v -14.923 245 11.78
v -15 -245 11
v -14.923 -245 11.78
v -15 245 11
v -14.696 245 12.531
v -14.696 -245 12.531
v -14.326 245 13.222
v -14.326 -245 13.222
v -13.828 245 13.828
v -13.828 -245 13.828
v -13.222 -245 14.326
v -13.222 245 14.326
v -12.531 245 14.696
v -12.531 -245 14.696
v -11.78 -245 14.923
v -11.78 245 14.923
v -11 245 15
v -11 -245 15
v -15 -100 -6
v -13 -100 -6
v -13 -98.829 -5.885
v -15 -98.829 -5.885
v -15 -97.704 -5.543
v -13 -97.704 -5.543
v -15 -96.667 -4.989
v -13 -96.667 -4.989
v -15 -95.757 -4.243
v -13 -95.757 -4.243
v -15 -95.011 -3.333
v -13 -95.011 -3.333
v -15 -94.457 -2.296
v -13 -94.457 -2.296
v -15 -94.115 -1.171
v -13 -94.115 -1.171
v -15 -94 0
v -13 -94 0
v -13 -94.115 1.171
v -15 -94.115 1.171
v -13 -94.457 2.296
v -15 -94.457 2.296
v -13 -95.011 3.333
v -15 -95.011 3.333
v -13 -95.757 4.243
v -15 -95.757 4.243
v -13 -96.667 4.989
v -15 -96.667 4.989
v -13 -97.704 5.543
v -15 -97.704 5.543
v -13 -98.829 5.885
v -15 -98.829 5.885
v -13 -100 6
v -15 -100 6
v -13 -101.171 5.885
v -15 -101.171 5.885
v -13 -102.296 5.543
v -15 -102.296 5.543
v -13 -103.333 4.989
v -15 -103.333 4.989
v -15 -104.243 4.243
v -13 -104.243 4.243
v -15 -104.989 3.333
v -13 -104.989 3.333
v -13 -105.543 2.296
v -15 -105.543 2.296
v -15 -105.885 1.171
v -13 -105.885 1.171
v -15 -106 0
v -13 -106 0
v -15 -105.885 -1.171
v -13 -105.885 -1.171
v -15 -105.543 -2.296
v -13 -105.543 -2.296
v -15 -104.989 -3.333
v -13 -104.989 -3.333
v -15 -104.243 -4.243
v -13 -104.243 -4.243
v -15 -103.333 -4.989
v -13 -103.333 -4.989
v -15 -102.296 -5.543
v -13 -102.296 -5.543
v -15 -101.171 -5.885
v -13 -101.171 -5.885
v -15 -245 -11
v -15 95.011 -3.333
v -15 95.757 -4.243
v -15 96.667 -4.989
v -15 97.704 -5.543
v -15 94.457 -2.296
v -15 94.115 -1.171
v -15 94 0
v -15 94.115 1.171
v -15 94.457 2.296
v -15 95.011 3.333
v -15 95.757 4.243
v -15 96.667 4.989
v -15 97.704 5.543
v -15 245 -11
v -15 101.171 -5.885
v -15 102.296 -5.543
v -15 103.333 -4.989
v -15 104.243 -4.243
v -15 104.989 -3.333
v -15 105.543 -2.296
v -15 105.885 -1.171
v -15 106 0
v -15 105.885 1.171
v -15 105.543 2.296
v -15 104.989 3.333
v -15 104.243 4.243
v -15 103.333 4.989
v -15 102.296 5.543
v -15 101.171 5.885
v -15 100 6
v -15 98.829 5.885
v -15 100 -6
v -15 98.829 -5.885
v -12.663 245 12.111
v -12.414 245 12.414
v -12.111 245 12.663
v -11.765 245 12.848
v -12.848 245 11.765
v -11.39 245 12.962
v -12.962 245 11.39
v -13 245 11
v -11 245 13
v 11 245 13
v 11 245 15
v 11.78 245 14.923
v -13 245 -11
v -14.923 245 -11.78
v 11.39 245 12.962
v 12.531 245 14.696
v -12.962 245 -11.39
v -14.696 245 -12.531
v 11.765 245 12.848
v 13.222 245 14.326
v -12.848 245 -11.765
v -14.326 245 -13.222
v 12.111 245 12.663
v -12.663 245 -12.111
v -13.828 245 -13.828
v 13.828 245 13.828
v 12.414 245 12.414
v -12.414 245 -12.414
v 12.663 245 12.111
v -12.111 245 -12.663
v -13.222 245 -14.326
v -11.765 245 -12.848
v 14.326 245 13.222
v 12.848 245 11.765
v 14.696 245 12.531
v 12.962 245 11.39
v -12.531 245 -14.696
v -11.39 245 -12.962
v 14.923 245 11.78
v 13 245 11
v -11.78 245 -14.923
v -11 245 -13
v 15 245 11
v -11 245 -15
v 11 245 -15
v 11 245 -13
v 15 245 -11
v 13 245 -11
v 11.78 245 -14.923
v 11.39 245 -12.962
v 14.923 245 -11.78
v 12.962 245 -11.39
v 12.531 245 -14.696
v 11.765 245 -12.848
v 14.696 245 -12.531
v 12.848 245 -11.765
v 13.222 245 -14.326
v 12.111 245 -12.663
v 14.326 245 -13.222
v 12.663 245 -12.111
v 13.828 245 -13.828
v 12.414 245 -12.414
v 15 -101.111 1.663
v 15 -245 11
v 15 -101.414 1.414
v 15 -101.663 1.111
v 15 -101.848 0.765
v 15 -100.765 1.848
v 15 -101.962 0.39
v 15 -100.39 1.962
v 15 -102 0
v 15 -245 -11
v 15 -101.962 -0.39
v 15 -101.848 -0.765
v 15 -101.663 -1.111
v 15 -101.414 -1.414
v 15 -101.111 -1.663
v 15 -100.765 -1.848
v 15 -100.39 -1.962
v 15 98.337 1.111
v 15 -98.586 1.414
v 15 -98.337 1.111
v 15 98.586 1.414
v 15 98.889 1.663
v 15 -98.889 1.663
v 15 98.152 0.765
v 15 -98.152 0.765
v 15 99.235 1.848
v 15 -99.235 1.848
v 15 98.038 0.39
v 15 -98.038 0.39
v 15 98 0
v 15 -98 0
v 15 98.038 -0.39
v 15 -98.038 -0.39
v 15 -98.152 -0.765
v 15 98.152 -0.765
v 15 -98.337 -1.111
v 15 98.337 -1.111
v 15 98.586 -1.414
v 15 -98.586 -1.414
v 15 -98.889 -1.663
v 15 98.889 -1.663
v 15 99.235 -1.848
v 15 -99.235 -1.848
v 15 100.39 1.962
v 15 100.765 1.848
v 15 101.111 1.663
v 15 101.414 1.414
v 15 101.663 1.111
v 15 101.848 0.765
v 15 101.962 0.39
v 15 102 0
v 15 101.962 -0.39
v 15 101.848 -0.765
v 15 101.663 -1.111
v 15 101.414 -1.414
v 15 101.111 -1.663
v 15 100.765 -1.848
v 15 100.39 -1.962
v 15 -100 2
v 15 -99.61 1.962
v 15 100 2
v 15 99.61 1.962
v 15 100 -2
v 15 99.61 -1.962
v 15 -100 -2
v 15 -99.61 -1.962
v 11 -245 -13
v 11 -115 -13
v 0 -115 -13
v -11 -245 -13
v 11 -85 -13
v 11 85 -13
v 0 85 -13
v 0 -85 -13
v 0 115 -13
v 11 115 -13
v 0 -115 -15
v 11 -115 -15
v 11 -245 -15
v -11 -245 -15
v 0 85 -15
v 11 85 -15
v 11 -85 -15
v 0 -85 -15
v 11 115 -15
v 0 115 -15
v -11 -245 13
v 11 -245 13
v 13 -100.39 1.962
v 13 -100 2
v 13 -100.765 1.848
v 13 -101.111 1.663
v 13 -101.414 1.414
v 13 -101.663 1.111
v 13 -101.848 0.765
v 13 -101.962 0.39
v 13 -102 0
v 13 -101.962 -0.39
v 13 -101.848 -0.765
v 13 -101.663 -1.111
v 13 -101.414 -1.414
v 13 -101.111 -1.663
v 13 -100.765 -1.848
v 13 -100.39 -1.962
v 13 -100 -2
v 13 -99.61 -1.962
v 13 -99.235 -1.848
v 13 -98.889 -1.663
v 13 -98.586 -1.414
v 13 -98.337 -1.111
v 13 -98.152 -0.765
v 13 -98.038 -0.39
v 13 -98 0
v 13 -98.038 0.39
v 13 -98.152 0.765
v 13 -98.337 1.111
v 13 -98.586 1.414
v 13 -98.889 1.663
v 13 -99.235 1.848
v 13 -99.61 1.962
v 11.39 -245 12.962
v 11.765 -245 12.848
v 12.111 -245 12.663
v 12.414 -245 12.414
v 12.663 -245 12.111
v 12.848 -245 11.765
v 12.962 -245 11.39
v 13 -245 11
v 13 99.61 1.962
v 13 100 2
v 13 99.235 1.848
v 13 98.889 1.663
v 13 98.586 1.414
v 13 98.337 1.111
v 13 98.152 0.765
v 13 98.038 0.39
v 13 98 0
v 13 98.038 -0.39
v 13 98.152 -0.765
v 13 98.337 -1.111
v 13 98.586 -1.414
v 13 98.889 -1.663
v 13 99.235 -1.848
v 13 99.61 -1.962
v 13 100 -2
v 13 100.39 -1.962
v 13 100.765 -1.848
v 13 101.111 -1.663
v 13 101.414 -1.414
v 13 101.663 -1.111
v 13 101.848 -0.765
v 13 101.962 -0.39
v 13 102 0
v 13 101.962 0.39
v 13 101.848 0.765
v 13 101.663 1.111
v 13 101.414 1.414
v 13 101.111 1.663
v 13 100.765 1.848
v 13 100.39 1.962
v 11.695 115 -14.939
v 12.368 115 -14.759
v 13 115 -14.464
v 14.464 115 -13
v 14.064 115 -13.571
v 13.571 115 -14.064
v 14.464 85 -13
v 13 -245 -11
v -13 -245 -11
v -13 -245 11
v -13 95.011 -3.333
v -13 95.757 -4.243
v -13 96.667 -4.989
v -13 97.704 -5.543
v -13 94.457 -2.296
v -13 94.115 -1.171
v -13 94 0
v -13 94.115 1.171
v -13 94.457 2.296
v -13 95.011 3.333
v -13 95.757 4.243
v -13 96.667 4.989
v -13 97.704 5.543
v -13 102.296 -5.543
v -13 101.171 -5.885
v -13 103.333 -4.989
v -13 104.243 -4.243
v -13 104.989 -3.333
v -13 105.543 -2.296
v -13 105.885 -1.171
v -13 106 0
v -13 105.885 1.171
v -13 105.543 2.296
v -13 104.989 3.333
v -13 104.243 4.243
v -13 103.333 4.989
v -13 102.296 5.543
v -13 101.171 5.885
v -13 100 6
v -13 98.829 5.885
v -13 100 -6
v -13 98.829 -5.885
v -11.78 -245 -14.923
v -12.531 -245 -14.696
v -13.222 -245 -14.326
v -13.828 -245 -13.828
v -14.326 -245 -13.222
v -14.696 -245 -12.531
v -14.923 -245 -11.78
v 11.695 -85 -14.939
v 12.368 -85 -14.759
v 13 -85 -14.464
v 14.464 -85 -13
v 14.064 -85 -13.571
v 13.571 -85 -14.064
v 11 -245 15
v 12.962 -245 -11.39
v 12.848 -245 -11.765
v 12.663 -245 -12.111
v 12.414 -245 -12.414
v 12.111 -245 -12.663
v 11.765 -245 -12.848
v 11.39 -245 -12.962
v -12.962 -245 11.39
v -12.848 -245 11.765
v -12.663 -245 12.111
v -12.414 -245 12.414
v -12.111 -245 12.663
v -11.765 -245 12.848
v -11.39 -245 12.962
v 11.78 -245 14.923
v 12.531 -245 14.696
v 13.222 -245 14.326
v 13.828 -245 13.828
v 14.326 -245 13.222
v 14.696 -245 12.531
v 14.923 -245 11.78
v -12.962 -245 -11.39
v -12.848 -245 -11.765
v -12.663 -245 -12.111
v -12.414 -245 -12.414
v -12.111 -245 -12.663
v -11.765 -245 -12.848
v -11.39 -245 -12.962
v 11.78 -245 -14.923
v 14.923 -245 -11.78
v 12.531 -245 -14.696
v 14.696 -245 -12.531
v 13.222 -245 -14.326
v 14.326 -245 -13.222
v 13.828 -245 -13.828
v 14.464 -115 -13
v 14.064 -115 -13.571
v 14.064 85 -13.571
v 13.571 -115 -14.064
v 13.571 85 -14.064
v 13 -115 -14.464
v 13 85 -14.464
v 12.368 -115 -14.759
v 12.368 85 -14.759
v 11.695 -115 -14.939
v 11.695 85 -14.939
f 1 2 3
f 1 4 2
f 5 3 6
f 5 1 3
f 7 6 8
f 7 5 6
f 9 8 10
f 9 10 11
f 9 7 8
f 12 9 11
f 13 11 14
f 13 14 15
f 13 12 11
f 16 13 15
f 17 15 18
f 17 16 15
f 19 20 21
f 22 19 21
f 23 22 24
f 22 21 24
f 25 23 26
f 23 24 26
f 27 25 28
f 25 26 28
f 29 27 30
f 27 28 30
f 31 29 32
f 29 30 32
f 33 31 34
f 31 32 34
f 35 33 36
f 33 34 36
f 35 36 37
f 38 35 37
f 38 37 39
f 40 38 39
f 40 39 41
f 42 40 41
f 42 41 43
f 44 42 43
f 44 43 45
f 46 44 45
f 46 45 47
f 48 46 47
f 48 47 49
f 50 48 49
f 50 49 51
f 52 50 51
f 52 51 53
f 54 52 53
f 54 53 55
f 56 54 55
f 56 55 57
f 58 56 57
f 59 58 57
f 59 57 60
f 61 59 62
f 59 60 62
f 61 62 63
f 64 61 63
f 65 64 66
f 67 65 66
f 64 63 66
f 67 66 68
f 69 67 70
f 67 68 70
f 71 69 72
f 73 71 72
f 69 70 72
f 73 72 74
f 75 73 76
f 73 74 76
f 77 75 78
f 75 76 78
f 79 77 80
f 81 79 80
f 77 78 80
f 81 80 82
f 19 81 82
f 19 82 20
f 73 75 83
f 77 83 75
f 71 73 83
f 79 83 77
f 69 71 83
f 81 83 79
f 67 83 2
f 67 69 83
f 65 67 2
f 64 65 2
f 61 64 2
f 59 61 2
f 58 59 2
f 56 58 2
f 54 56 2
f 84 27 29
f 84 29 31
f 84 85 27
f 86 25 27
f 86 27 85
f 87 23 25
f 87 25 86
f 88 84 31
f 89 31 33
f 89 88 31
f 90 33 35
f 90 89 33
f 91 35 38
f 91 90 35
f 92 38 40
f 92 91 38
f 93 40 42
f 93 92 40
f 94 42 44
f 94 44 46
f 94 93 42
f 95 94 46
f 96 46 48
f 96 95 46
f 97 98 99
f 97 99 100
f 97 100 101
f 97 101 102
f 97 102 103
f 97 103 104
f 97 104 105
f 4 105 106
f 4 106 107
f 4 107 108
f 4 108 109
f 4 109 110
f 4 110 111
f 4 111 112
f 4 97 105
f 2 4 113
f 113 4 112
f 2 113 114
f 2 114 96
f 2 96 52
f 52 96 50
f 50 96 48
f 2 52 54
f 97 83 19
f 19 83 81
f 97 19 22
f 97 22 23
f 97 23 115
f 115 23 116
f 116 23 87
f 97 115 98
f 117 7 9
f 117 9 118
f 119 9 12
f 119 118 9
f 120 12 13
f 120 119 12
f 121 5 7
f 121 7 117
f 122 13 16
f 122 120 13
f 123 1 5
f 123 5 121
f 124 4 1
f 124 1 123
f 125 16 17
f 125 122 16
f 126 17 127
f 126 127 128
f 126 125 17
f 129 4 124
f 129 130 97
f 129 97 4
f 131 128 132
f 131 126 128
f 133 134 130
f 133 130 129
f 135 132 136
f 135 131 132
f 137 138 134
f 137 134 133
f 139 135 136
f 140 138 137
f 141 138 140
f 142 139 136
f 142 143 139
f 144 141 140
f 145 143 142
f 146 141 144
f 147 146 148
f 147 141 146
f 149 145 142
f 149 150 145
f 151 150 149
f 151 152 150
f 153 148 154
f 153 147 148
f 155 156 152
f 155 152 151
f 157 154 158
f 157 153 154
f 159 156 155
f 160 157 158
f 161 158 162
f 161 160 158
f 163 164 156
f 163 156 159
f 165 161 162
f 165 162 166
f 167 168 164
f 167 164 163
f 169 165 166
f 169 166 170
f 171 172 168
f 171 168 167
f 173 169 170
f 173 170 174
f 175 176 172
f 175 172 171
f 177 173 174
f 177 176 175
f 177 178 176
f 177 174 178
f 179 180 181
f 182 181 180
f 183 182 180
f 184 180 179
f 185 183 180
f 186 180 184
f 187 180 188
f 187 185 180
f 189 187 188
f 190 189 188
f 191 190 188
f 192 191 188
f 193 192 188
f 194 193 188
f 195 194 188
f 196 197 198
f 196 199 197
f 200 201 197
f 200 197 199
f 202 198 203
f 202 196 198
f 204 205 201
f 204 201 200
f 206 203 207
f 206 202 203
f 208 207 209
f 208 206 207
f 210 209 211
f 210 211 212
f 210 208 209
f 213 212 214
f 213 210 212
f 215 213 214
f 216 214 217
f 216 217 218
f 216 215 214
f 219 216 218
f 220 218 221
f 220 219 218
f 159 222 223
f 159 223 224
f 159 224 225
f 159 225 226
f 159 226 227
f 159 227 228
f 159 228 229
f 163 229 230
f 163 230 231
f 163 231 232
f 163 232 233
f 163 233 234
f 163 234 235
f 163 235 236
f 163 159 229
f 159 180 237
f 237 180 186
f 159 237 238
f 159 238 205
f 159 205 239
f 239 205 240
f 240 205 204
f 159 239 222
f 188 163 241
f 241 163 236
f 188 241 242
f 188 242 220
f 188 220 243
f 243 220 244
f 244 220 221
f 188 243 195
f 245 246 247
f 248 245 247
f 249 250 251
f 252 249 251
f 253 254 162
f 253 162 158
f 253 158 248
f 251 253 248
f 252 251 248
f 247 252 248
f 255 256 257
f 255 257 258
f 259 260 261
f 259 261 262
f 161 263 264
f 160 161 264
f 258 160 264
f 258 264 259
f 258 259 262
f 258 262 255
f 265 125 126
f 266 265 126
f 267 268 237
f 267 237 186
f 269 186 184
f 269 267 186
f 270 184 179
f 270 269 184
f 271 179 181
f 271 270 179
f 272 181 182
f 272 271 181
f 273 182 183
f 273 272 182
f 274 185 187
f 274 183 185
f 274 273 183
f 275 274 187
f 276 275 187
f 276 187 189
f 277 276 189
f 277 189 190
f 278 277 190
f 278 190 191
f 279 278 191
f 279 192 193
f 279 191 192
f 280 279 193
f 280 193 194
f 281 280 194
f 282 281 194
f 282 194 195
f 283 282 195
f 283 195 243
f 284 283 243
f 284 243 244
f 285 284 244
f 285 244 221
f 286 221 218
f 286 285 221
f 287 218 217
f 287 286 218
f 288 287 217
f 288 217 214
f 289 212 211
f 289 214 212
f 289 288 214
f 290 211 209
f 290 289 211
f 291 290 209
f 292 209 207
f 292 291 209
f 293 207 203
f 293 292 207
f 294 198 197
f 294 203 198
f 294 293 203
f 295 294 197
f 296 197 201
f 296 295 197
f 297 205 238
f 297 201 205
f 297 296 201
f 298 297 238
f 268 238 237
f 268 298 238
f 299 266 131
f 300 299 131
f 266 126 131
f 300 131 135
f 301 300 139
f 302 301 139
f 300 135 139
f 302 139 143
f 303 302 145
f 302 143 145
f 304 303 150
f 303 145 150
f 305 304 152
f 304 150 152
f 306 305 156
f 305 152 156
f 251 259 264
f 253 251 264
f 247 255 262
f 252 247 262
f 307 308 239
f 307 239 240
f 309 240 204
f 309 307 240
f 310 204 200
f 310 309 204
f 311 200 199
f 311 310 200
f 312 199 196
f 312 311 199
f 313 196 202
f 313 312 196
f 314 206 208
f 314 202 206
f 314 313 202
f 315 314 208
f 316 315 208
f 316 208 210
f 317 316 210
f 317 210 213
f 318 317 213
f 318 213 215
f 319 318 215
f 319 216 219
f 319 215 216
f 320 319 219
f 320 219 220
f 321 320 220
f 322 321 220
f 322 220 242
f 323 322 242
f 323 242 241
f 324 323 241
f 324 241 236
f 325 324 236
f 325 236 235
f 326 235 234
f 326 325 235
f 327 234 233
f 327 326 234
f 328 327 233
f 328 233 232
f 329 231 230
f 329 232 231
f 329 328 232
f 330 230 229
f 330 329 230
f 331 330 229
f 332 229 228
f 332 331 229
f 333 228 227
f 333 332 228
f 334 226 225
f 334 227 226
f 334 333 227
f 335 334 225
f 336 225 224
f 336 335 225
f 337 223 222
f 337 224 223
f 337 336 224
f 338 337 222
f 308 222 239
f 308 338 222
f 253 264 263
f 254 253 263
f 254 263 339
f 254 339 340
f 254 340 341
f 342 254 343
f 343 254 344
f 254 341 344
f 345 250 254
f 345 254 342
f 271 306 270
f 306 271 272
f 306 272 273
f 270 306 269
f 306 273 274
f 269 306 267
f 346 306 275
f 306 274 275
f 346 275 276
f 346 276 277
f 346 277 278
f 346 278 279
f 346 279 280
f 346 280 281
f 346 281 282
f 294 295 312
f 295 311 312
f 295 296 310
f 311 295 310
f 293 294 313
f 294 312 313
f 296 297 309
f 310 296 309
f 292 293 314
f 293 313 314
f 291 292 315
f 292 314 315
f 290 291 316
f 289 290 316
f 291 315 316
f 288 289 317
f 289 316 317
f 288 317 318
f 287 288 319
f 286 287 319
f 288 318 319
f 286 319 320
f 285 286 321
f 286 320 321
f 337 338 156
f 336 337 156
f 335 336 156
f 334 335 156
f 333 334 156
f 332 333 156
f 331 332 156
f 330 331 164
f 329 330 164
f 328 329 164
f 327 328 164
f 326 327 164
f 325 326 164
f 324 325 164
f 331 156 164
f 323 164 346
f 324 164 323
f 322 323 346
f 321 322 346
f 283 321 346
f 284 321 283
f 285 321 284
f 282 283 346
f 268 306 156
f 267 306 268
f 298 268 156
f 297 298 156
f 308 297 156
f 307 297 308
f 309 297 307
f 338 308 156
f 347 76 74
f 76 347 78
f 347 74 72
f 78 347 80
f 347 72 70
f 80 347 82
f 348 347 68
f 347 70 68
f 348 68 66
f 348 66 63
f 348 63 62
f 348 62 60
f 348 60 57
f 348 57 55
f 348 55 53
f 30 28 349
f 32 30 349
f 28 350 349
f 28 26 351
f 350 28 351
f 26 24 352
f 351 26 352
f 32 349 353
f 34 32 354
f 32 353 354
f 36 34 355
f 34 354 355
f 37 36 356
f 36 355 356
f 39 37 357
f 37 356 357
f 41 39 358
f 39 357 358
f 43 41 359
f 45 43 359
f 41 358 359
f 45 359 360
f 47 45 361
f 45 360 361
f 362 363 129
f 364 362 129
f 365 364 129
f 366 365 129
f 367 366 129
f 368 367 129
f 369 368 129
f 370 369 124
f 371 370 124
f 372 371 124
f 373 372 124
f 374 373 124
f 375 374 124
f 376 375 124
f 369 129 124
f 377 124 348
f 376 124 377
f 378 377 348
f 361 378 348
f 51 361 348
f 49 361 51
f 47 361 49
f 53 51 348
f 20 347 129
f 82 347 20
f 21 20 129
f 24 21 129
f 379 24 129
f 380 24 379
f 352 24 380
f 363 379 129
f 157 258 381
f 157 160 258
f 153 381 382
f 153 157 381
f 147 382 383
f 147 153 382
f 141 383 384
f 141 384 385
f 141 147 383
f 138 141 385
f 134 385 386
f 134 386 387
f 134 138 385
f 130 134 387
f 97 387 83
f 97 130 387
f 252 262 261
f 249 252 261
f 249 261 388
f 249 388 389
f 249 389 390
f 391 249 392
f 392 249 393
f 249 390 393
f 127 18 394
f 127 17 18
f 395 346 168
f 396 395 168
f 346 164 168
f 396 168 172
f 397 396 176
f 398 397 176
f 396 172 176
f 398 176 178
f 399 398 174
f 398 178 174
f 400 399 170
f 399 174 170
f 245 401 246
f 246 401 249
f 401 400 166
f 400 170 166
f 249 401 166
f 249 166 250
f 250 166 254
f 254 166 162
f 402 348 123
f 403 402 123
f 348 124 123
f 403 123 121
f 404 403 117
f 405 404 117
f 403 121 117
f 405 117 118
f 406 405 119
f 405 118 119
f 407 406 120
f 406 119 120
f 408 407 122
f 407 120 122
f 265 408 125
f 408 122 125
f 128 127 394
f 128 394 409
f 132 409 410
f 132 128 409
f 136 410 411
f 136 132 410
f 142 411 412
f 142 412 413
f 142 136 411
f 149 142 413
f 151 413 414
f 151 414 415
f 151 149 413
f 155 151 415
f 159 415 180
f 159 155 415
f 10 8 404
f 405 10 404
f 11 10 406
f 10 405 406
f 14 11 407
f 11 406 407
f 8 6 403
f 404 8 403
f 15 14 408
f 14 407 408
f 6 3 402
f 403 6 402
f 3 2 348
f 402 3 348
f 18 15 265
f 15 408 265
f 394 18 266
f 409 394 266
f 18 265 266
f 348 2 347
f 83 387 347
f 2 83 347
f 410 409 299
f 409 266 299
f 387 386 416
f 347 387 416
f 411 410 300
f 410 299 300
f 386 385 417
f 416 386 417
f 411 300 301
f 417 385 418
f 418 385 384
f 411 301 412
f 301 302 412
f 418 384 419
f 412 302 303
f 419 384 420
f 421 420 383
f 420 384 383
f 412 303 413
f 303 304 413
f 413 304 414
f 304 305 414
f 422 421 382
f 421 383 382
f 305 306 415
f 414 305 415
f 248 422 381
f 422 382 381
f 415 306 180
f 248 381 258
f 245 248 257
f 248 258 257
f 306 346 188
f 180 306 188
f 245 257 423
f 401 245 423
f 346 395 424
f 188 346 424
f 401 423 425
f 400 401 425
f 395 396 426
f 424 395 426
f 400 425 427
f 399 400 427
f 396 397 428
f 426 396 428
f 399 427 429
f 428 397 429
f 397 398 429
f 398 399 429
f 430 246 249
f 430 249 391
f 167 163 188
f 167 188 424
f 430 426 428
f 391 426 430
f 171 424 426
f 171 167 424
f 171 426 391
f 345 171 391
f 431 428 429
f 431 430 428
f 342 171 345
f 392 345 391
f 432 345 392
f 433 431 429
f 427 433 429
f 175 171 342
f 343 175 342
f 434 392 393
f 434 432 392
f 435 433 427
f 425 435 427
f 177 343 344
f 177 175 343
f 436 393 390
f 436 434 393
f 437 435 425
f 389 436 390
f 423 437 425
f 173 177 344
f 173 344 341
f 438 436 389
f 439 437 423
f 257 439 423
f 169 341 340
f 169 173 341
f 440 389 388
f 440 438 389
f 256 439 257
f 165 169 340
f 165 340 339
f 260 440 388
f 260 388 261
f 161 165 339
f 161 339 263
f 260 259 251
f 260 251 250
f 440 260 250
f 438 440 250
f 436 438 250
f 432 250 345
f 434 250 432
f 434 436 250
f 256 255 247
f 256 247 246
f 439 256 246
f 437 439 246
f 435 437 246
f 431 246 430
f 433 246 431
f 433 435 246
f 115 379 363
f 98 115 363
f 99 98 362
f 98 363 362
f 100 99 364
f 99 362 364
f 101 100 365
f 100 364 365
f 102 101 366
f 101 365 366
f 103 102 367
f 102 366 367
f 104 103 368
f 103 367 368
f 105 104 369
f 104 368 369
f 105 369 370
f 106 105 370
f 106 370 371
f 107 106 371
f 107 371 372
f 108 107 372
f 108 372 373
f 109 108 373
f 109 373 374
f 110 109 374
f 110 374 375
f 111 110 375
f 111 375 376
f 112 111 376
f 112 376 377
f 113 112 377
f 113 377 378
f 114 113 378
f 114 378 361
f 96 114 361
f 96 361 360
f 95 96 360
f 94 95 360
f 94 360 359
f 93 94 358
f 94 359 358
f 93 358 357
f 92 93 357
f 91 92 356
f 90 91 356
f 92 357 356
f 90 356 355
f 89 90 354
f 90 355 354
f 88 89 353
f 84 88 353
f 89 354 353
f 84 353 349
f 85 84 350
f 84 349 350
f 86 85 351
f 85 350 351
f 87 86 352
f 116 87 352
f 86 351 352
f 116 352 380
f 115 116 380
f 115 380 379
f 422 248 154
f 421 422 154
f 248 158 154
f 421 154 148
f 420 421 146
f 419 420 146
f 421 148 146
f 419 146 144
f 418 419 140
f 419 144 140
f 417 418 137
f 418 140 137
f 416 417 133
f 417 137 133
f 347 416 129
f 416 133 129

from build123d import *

# Parameters (mm, degrees)
EXTRUDE_1_DEPTH     = 245
CUT_EXTRUDE_1_REACH = 247.917
SKETCH_2_R          = 2
CUT_EXTRUDE_2_REACH = 247.917
SKETCH_3_R          = 6
SKETCH_4_W          = 15
SKETCH_4_H          = 30
CUT_EXTRUDE_3_DEPTH = 2


with BuildPart() as part:
    # 草图1 → 凸台-拉伸1 (new, symmetric)
    with BuildSketch(Plane(origin=(0, 0, 0), x_dir=(1, 0, 0), z_dir=(0, 1, 0))):
        with BuildLine():
            Line((-11, -15), (11, -15))
            ThreePointArc((11, -15), (13.828427125, -13.828427125), (15, -11))
            Line((15, -11), (15, 11))
            ThreePointArc((15, 11), (13.828427125, 13.828427125), (11, 15))
            Line((11, 15), (-11, 15))
            ThreePointArc((-11, 15), (-13.828427125, 13.828427125), (-15, 11))
            Line((-15, 11), (-15, -11))
            ThreePointArc((-15, -11), (-13.828427125, -13.828427125), (-11, -15))
        make_face()
        with BuildLine():
            Line((-11, -13), (11, -13))
            ThreePointArc((11, -13), (12.414213562, -12.414213562), (13, -11))
            Line((13, -11), (13, 11))
            ThreePointArc((13, 11), (12.414213562, 12.414213562), (11, 13))
            Line((11, 13), (-11, 13))
            ThreePointArc((-11, 13), (-12.414213562, 12.414213562), (-13, 11))
            Line((-13, 11), (-13, -11))
            ThreePointArc((-13, -11), (-12.414213562, -12.414213562), (-11, -13))
        make_face(mode=Mode.SUBTRACT)
    extrude(amount=EXTRUDE_1_DEPTH, both=True)

    # 草图2 → 切除-拉伸1 (cut, up to next)
    with BuildSketch(Plane(origin=(0, 0, 0), x_dir=(0, 0, -1), z_dir=(1, 0, 0)), mode=Mode.PRIVATE) as cut_extrude_1_sk1:
        with Locations(Location((0, -100, 0), (0, 0, 180))):
            Circle(SKETCH_2_R)
    cut_extrude_1_tool1 = extrude(cut_extrude_1_sk1.sketch, amount=CUT_EXTRUDE_1_REACH, mode=Mode.PRIVATE) & part.part
    # 草图2 → 切除-拉伸1 (cut, up to next)
    with BuildSketch(Plane(origin=(0, 0, 0), x_dir=(0, 0, -1), z_dir=(1, 0, 0)), mode=Mode.PRIVATE) as cut_extrude_1_sk2:
        with Locations(Location((0, 100, 0), (0, 0, 180))):
            Circle(SKETCH_2_R)
    cut_extrude_1_tool2 = extrude(cut_extrude_1_sk2.sketch, amount=CUT_EXTRUDE_1_REACH, mode=Mode.PRIVATE) & part.part
    add(cut_extrude_1_tool1.solids().sort_by_distance((0, -100, 0))[0], mode=Mode.SUBTRACT)
    add(cut_extrude_1_tool2.solids().sort_by_distance((0, 100, 0))[0], mode=Mode.SUBTRACT)

    # 草图3 → 切除-拉伸2 (cut, up to next)
    with BuildSketch(Plane(origin=(0, 0, 0), x_dir=(0, 0, -1), z_dir=(1, 0, 0)), mode=Mode.PRIVATE) as cut_extrude_2_sk1:
        with Locations((0, -100)):
            Circle(SKETCH_3_R)
    cut_extrude_2_tool1 = extrude(cut_extrude_2_sk1.sketch, amount=-CUT_EXTRUDE_2_REACH, mode=Mode.PRIVATE) & part.part
    # 草图3 → 切除-拉伸2 (cut, up to next)
    with BuildSketch(Plane(origin=(0, 0, 0), x_dir=(0, 0, -1), z_dir=(1, 0, 0)), mode=Mode.PRIVATE) as cut_extrude_2_sk2:
        with Locations((0, 100)):
            Circle(SKETCH_3_R)
    cut_extrude_2_tool2 = extrude(cut_extrude_2_sk2.sketch, amount=-CUT_EXTRUDE_2_REACH, mode=Mode.PRIVATE) & part.part
    add(cut_extrude_2_tool1.solids().sort_by_distance((0, -100, 0))[0], mode=Mode.SUBTRACT)
    add(cut_extrude_2_tool2.solids().sort_by_distance((0, 100, 0))[0], mode=Mode.SUBTRACT)

    # 草图4 → 切除-拉伸3 (cut)
    with BuildSketch(Plane.XY.offset(-15)):
        with Locations((7.5, -100)):
            Rectangle(SKETCH_4_W, SKETCH_4_H)
        with Locations((7.5, 100)):
            Rectangle(SKETCH_4_W, SKETCH_4_H)
    extrude(amount=CUT_EXTRUDE_3_DEPTH, mode=Mode.SUBTRACT)


solid = part.part
